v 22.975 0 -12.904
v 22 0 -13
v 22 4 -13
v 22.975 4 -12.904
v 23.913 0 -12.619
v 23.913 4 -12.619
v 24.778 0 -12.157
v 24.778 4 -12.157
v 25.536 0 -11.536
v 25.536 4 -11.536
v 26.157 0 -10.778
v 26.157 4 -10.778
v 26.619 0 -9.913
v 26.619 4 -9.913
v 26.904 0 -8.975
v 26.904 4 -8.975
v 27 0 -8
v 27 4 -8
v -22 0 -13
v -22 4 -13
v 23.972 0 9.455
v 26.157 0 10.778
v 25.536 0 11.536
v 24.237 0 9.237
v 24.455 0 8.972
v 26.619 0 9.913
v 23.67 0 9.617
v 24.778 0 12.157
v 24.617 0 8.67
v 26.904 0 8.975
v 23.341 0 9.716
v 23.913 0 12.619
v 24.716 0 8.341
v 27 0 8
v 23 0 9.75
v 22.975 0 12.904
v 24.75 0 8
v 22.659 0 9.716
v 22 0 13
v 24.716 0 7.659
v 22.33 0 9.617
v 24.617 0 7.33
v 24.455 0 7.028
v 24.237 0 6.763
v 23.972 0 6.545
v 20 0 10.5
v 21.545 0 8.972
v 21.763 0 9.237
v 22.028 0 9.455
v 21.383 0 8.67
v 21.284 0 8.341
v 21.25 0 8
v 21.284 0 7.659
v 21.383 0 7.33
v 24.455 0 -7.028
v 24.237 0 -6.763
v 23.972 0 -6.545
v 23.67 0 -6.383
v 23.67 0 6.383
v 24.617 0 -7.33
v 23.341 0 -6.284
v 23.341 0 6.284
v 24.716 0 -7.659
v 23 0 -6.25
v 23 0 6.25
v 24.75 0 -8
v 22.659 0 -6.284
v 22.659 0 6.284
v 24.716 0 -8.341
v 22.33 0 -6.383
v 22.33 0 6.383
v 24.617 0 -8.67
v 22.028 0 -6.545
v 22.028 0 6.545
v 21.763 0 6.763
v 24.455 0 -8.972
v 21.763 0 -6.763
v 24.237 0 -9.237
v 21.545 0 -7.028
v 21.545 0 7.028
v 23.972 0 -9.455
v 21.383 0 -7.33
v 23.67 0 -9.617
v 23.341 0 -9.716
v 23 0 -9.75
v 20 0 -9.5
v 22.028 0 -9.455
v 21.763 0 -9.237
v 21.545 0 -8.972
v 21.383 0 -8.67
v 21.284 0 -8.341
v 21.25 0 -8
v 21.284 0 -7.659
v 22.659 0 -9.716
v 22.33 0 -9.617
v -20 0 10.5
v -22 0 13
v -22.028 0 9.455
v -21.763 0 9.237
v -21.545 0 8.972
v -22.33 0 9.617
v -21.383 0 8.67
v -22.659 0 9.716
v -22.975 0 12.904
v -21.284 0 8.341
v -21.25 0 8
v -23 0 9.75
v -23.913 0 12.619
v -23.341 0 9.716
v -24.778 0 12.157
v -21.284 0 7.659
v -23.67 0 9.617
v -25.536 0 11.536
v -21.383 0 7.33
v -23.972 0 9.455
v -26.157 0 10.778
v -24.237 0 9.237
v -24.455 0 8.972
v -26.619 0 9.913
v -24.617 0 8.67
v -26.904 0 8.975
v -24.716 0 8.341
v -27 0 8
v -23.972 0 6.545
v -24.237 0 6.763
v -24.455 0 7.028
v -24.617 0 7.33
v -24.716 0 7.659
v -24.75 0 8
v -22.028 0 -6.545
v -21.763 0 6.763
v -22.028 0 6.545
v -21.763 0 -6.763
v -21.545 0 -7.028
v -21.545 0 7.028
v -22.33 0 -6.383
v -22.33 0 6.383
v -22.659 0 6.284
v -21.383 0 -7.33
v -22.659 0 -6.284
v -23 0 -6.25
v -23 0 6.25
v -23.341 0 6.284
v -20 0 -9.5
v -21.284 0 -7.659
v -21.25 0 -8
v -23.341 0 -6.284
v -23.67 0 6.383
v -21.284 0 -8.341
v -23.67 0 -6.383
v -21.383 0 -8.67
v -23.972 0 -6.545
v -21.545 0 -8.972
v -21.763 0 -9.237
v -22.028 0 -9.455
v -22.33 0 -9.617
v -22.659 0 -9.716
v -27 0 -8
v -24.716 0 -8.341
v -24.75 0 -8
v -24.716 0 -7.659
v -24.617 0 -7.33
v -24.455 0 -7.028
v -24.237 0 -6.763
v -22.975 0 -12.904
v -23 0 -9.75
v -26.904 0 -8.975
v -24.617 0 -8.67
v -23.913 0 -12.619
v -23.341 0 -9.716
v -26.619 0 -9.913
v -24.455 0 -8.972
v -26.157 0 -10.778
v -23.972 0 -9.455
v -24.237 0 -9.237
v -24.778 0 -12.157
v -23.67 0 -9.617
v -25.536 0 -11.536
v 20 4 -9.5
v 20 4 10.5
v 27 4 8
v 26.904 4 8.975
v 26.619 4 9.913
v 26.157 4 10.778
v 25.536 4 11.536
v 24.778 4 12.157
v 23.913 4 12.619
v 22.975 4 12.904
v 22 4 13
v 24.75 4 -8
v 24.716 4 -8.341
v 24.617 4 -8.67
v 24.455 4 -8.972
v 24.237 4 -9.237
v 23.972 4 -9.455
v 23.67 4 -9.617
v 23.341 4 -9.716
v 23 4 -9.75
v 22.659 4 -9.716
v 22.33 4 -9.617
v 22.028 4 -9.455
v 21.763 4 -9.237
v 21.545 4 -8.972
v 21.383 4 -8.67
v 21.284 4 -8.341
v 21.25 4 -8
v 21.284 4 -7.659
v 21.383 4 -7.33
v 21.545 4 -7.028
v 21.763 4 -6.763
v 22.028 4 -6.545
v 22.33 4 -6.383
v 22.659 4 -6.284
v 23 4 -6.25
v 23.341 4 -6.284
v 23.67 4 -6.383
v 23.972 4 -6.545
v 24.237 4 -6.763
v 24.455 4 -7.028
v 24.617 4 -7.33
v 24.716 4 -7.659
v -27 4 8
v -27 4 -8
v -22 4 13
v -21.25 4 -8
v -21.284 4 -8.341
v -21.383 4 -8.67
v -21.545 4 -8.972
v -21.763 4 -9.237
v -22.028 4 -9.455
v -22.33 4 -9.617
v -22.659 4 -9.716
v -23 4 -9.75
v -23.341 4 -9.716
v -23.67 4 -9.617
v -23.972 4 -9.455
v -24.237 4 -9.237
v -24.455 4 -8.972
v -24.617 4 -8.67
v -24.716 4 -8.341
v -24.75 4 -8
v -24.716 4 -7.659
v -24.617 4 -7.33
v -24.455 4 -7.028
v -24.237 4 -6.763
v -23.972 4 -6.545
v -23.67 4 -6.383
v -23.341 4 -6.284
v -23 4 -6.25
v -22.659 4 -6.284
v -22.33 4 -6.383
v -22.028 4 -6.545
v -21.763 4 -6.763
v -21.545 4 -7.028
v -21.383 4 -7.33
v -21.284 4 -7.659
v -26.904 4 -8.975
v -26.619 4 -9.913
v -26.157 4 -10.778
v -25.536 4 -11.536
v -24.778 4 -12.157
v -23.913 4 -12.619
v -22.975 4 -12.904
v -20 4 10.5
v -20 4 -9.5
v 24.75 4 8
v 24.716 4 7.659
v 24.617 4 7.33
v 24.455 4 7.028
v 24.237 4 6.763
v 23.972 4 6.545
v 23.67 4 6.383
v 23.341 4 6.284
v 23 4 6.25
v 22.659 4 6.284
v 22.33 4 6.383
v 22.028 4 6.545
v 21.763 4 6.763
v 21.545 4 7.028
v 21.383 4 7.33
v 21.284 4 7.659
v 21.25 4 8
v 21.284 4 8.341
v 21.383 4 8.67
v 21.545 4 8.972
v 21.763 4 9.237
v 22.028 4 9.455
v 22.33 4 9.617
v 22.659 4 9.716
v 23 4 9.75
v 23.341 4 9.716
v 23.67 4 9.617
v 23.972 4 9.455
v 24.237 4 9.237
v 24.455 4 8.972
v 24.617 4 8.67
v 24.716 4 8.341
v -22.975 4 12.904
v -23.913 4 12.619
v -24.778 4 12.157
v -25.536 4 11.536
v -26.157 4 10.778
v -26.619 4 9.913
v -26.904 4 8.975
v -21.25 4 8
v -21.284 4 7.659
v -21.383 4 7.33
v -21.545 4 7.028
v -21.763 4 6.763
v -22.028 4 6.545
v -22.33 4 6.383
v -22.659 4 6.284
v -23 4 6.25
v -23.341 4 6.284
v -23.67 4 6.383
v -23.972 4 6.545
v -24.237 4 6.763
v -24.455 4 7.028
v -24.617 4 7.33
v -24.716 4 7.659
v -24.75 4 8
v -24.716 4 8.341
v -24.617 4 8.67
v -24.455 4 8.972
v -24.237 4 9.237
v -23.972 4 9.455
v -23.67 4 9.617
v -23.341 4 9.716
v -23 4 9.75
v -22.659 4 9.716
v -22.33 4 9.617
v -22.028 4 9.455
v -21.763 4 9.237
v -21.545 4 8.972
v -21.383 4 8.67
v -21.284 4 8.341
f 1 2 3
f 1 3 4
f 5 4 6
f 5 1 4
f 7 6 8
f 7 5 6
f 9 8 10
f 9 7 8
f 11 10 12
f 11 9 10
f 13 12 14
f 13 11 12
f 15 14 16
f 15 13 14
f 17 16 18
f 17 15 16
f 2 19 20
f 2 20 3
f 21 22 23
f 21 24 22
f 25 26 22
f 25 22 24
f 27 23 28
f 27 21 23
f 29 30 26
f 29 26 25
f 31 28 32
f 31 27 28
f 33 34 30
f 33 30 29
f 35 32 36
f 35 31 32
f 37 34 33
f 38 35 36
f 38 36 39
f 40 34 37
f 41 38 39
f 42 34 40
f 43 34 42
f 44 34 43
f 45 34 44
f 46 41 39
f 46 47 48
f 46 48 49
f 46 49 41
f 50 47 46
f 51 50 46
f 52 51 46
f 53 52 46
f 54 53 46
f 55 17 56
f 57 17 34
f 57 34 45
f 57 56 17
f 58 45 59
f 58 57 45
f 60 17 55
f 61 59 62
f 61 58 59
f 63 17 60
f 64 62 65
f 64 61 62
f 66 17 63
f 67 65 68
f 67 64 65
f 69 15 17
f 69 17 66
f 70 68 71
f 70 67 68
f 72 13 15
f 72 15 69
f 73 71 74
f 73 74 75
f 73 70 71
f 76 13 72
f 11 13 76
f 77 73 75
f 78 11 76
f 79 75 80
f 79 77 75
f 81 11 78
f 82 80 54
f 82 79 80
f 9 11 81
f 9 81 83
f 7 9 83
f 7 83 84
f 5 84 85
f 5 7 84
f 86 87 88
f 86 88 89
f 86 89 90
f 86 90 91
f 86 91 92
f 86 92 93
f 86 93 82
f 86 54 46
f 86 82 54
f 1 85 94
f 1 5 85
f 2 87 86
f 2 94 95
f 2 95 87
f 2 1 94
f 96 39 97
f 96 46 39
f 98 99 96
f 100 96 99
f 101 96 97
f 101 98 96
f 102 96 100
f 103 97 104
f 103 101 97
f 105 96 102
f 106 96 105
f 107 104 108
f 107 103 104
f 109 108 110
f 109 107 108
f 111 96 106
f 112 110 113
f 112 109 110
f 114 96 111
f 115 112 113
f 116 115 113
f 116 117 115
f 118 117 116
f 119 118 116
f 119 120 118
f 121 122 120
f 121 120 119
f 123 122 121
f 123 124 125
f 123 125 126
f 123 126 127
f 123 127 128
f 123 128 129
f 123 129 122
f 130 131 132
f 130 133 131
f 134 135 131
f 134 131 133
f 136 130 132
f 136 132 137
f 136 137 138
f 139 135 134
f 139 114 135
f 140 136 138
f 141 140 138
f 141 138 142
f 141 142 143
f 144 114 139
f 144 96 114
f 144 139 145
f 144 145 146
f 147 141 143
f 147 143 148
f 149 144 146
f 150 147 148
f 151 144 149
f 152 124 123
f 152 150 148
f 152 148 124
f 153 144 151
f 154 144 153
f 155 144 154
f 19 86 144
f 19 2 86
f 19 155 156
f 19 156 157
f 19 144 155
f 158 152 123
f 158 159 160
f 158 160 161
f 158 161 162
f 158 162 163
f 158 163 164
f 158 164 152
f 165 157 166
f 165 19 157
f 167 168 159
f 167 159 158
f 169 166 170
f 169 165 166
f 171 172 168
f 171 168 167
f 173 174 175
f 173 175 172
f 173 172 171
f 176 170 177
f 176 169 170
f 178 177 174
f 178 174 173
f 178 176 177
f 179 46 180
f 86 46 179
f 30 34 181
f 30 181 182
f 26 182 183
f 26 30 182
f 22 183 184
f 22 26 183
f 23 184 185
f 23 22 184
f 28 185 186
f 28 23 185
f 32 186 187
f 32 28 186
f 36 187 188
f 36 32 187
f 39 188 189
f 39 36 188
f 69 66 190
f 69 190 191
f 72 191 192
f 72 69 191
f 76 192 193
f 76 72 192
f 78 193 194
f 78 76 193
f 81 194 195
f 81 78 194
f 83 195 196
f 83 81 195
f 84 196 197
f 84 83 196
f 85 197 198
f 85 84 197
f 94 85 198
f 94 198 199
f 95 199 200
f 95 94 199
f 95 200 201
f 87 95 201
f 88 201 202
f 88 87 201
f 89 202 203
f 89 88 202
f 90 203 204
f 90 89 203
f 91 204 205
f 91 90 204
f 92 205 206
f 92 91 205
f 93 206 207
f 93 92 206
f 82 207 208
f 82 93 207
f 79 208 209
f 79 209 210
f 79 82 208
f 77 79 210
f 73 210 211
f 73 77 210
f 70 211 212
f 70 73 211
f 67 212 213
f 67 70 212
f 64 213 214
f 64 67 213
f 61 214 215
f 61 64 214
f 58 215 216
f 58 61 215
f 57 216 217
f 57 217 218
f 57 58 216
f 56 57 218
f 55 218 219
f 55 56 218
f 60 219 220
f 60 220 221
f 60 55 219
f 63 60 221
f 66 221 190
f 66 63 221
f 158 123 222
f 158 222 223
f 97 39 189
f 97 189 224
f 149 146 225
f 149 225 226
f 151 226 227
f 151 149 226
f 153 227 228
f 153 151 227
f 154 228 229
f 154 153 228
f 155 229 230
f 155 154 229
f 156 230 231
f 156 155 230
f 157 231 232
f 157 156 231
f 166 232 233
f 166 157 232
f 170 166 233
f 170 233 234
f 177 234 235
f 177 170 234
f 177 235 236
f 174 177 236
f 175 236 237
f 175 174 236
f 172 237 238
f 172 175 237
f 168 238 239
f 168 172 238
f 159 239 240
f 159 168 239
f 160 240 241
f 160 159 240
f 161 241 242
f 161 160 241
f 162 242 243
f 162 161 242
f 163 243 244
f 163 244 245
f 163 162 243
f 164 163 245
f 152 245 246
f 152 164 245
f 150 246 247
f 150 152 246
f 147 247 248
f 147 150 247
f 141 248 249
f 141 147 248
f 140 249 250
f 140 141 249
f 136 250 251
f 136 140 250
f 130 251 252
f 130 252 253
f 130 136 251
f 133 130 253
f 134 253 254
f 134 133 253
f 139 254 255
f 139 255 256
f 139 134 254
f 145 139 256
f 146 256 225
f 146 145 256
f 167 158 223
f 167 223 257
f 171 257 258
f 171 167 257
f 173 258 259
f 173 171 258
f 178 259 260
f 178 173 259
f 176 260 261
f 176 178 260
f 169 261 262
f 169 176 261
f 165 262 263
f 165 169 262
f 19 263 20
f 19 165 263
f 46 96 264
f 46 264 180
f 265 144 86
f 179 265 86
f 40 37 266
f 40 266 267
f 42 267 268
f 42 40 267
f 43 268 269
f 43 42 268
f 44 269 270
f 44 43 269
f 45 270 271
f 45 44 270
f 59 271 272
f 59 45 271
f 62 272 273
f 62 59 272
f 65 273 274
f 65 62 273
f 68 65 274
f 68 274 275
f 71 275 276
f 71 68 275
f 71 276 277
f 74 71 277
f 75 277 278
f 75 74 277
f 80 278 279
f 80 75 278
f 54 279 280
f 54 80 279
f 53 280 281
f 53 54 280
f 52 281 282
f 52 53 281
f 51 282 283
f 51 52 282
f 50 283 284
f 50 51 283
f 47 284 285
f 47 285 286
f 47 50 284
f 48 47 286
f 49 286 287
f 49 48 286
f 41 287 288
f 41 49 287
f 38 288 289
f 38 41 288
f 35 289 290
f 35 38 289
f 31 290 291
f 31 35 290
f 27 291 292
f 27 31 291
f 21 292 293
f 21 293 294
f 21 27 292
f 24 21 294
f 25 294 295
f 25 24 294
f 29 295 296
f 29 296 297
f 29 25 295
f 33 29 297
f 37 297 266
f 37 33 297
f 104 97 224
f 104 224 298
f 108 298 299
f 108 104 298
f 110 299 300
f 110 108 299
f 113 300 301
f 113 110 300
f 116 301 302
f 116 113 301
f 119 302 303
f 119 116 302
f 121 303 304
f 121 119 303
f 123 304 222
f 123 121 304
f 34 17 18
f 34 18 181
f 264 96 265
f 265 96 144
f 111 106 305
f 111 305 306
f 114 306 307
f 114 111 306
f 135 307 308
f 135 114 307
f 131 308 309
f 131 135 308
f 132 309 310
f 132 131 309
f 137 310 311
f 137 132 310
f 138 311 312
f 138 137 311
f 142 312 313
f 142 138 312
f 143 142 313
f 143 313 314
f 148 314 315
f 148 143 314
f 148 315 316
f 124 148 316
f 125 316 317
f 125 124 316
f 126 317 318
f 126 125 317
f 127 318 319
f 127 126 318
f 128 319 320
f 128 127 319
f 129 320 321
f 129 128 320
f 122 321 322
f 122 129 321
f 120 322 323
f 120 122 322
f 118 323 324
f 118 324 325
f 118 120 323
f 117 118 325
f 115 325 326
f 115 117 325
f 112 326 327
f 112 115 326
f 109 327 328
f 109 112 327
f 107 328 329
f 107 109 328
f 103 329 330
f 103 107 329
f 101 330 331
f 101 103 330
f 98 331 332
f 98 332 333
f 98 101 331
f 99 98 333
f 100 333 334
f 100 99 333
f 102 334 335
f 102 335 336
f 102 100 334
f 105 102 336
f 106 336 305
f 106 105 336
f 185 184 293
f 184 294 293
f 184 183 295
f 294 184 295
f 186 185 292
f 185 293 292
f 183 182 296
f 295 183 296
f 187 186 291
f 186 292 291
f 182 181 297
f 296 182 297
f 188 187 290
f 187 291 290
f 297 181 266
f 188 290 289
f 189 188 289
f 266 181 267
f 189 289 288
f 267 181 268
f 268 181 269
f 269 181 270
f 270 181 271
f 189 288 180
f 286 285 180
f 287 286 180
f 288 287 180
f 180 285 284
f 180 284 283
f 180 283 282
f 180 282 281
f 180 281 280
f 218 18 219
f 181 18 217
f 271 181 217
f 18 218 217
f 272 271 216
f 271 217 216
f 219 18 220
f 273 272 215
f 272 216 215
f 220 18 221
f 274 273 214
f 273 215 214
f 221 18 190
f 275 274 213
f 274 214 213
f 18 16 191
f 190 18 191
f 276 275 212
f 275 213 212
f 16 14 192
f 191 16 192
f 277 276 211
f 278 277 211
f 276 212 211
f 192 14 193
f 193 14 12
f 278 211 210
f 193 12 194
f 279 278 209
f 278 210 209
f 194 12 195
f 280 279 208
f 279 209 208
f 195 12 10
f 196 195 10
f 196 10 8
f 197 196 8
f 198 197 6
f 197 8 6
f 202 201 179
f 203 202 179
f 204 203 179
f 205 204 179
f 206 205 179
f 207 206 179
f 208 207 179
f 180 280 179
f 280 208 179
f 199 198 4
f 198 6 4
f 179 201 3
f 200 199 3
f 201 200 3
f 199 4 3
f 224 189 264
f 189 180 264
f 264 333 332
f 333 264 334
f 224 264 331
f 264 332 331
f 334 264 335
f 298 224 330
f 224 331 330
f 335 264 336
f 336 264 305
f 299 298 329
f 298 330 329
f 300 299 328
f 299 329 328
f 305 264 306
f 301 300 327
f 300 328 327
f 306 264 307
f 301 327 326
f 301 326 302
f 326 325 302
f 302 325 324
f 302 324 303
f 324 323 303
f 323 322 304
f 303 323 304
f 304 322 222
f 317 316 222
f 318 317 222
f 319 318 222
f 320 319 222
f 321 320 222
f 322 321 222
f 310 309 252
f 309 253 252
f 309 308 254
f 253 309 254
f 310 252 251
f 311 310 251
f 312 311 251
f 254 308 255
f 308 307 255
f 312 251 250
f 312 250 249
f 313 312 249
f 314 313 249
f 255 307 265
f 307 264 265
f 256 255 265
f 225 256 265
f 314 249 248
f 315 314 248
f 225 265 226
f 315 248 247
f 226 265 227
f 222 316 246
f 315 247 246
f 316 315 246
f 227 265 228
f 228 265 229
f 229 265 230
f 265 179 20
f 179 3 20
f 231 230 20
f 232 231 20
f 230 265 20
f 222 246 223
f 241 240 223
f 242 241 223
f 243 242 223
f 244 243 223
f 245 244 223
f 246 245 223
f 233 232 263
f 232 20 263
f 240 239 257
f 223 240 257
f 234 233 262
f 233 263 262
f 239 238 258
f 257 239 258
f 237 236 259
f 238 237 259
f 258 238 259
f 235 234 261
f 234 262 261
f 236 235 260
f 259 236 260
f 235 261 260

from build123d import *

# Parameters (mm, degrees)
SKETCH_1_R      = 1.75
SKETCH_1_W      = 40
SKETCH_1_H      = 20
EXTRUDE_1_DEPTH = 4


with BuildPart() as part:
    # 草图1 → 凸台-拉伸1 (new body)
    with BuildSketch(Plane(origin=(0, 0, 0), x_dir=(1, 0, 0), z_dir=(0, 1, 0))):
        with BuildLine():
            Line((-22, 13), (22, 13))
            ThreePointArc((22, 13), (25.535533906, 11.535533906), (27, 8))
            Line((27, 8), (27, -8))
            ThreePointArc((27, -8), (25.535533906, -11.535533906), (22, -13))
            Line((22, -13), (-22, -13))
            ThreePointArc((-22, -13), (-25.535533906, -11.535533906), (-27, -8))
            Line((-27, -8), (-27, 8))
            ThreePointArc((-27, 8), (-25.535533906, 11.535533906), (-22, 13))
        make_face()
        with Locations((-23, -8)):
            Circle(SKETCH_1_R, mode=Mode.SUBTRACT)
        with Locations((-23, 8)):
            Circle(SKETCH_1_R, mode=Mode.SUBTRACT)
        with Locations((23, 8)):
            Circle(SKETCH_1_R, mode=Mode.SUBTRACT)
        with Locations((23, -8)):
            Circle(SKETCH_1_R, mode=Mode.SUBTRACT)
        with Locations((0, -0.5)):
            Rectangle(SKETCH_1_W, SKETCH_1_H, mode=Mode.SUBTRACT)
    extrude(amount=EXTRUDE_1_DEPTH)


solid = part.part
